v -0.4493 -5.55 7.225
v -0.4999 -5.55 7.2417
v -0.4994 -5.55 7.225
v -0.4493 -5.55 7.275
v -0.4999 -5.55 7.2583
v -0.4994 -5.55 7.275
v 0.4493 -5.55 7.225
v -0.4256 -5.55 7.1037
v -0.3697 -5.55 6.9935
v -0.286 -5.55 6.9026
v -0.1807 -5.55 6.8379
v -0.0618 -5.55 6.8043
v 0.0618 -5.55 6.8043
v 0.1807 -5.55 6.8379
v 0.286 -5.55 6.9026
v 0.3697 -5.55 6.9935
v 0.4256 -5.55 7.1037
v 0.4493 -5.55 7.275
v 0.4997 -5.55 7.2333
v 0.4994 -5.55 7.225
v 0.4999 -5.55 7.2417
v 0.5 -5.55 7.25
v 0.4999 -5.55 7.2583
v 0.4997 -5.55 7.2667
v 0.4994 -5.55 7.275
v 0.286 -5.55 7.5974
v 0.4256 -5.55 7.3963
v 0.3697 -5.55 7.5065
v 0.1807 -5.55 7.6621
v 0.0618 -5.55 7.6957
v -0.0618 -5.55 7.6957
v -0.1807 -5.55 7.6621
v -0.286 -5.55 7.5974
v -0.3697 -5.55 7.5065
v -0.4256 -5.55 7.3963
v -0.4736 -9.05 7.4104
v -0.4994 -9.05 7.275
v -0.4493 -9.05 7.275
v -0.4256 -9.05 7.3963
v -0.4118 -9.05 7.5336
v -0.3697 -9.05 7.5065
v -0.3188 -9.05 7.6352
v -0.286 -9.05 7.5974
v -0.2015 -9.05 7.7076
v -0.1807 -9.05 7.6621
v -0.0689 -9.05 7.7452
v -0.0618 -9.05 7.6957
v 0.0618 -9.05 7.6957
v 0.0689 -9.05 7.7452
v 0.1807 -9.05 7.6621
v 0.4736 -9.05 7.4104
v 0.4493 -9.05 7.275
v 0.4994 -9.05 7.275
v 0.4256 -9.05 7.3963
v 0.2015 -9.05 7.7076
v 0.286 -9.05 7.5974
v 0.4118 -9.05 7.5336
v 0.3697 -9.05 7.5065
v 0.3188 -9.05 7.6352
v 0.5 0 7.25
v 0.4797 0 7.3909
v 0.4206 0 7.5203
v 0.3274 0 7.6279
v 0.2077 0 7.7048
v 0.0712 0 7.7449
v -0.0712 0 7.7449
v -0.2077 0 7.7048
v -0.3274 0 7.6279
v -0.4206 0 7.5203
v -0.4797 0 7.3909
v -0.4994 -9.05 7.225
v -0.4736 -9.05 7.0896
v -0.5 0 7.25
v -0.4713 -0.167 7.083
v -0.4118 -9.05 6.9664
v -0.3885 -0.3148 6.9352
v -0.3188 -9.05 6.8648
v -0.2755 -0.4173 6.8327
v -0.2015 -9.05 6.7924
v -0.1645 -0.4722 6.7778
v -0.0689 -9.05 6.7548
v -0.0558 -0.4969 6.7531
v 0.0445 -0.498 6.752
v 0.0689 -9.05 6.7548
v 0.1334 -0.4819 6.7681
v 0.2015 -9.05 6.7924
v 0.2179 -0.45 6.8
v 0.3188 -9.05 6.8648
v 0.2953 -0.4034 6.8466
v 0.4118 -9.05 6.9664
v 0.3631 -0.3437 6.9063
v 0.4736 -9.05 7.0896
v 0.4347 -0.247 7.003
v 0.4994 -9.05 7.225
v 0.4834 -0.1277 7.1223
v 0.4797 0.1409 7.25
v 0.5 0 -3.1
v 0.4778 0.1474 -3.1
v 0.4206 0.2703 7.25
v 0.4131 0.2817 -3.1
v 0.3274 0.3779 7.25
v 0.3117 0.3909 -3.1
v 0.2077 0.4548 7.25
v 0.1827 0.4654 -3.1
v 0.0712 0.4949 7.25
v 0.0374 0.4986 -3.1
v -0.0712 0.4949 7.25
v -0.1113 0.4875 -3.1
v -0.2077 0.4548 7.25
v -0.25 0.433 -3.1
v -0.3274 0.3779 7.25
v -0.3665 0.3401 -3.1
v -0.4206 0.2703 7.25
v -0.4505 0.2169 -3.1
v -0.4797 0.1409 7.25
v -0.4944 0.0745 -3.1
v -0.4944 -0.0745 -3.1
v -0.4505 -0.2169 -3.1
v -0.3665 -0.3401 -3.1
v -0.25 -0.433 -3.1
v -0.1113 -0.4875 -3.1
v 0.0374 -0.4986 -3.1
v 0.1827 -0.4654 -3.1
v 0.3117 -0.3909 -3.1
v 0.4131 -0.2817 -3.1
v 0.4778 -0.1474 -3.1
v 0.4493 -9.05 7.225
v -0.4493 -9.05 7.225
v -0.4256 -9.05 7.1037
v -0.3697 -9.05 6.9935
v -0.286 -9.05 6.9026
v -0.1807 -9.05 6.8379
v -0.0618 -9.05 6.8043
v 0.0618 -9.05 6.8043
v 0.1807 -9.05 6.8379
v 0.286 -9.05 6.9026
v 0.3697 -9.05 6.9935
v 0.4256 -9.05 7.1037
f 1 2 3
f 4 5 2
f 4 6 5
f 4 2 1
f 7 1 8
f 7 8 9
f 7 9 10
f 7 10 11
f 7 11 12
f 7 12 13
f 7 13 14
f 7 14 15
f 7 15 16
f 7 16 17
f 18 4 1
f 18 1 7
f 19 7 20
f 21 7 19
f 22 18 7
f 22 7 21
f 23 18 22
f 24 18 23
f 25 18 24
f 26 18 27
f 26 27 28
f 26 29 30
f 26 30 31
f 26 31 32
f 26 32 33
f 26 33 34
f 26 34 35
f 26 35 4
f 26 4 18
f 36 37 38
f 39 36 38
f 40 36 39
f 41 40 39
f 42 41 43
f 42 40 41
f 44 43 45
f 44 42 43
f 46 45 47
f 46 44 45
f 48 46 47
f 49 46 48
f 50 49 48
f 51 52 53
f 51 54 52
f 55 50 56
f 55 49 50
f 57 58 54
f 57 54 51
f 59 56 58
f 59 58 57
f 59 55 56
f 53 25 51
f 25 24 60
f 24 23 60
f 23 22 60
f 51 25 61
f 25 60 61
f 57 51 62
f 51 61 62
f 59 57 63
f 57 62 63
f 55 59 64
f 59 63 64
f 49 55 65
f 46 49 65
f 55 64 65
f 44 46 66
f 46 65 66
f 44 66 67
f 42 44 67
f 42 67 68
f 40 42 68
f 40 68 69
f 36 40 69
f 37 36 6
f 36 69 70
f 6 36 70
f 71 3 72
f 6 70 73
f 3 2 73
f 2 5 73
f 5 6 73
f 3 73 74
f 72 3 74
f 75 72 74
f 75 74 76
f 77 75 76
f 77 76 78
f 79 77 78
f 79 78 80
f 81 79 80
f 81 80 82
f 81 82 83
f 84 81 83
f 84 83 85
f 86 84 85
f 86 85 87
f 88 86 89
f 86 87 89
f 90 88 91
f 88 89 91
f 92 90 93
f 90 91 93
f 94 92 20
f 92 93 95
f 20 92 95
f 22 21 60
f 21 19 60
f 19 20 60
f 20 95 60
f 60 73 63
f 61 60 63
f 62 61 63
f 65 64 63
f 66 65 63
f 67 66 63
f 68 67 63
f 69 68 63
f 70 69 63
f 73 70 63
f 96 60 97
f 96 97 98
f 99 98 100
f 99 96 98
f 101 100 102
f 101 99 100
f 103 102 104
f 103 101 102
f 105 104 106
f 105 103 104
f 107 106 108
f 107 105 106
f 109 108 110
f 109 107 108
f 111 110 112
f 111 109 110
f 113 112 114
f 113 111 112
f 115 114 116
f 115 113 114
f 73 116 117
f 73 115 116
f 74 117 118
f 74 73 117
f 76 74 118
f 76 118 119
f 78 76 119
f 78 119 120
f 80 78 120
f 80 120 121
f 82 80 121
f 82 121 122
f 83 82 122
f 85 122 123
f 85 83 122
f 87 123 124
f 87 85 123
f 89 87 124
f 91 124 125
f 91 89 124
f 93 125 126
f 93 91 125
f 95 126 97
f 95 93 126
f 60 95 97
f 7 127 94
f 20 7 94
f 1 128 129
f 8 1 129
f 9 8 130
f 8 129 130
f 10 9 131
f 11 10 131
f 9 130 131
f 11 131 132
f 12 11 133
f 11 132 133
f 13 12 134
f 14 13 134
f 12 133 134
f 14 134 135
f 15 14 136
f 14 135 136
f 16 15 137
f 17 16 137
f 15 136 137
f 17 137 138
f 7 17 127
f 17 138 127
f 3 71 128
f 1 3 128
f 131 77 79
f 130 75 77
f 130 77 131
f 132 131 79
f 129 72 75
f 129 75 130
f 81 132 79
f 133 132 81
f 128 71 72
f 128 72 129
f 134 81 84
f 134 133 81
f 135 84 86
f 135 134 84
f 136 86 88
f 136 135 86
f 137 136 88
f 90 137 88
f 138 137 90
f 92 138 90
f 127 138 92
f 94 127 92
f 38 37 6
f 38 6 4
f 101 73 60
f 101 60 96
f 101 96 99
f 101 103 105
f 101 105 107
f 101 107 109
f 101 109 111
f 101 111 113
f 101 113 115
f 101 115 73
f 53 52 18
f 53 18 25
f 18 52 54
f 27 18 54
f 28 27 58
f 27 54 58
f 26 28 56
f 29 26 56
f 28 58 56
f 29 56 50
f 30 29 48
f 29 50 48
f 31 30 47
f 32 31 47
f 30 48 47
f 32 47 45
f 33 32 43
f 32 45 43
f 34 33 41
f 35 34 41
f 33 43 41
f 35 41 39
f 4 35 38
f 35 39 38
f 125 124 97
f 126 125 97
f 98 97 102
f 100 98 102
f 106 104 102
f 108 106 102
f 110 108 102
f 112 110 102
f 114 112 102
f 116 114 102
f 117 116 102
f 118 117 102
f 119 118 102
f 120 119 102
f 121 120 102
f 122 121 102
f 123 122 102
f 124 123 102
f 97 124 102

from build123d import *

# Parameters (mm, degrees)
SKETCH015_R       = 0.5
PAD004_DEPTH      = 7.25
PAD004_DEPTH_BACK = 3.1
SKETCH016_R       = 0.5
PAD005_DEPTH      = 9.05
POCKET009_DEPTH   = 3.5


with BuildPart() as part:
    # Sketch015 → Pad004 (new body, two sides)
    with BuildSketch(Plane.XY) as pad004_sk:
        Circle(SKETCH015_R)
    extrude(amount=PAD004_DEPTH)
    extrude(pad004_sk.sketch, amount=-PAD004_DEPTH_BACK)

    # Sketch016 → Pad005 (join)
    with BuildSketch(Plane.XZ):
        with Locations((0, 7.25)):
            Circle(SKETCH016_R)
    extrude(amount=PAD005_DEPTH)

    # Sketch017 (on DatumPlane) → Pocket009 (cut)
    with BuildSketch(Plane.XZ.offset(9.05)):
        with BuildLine():
            ThreePointArc((-0.449305, 7.225), (0, 6.8), (0.449305, 7.225))
            Line((0.449305, 7.225), (0.499875, 7.225))
            ThreePointArc((0.499875, 7.225), (0.5005, 7.25), (0.499875, 7.275))
            Line((0.449305, 7.275), (0.499875, 7.275))
            ThreePointArc((0.449305, 7.275), (0, 7.7), (-0.449305, 7.275))
            Line((-0.499875, 7.275), (-0.449305, 7.275))
            ThreePointArc((-0.499875, 7.275), (-0.5005, 7.25), (-0.499875, 7.225))
            Line((-0.499875, 7.225), (-0.449305, 7.225))
        make_face()
    extrude(amount=-POCKET009_DEPTH, mode=Mode.SUBTRACT)


solid = part.part
